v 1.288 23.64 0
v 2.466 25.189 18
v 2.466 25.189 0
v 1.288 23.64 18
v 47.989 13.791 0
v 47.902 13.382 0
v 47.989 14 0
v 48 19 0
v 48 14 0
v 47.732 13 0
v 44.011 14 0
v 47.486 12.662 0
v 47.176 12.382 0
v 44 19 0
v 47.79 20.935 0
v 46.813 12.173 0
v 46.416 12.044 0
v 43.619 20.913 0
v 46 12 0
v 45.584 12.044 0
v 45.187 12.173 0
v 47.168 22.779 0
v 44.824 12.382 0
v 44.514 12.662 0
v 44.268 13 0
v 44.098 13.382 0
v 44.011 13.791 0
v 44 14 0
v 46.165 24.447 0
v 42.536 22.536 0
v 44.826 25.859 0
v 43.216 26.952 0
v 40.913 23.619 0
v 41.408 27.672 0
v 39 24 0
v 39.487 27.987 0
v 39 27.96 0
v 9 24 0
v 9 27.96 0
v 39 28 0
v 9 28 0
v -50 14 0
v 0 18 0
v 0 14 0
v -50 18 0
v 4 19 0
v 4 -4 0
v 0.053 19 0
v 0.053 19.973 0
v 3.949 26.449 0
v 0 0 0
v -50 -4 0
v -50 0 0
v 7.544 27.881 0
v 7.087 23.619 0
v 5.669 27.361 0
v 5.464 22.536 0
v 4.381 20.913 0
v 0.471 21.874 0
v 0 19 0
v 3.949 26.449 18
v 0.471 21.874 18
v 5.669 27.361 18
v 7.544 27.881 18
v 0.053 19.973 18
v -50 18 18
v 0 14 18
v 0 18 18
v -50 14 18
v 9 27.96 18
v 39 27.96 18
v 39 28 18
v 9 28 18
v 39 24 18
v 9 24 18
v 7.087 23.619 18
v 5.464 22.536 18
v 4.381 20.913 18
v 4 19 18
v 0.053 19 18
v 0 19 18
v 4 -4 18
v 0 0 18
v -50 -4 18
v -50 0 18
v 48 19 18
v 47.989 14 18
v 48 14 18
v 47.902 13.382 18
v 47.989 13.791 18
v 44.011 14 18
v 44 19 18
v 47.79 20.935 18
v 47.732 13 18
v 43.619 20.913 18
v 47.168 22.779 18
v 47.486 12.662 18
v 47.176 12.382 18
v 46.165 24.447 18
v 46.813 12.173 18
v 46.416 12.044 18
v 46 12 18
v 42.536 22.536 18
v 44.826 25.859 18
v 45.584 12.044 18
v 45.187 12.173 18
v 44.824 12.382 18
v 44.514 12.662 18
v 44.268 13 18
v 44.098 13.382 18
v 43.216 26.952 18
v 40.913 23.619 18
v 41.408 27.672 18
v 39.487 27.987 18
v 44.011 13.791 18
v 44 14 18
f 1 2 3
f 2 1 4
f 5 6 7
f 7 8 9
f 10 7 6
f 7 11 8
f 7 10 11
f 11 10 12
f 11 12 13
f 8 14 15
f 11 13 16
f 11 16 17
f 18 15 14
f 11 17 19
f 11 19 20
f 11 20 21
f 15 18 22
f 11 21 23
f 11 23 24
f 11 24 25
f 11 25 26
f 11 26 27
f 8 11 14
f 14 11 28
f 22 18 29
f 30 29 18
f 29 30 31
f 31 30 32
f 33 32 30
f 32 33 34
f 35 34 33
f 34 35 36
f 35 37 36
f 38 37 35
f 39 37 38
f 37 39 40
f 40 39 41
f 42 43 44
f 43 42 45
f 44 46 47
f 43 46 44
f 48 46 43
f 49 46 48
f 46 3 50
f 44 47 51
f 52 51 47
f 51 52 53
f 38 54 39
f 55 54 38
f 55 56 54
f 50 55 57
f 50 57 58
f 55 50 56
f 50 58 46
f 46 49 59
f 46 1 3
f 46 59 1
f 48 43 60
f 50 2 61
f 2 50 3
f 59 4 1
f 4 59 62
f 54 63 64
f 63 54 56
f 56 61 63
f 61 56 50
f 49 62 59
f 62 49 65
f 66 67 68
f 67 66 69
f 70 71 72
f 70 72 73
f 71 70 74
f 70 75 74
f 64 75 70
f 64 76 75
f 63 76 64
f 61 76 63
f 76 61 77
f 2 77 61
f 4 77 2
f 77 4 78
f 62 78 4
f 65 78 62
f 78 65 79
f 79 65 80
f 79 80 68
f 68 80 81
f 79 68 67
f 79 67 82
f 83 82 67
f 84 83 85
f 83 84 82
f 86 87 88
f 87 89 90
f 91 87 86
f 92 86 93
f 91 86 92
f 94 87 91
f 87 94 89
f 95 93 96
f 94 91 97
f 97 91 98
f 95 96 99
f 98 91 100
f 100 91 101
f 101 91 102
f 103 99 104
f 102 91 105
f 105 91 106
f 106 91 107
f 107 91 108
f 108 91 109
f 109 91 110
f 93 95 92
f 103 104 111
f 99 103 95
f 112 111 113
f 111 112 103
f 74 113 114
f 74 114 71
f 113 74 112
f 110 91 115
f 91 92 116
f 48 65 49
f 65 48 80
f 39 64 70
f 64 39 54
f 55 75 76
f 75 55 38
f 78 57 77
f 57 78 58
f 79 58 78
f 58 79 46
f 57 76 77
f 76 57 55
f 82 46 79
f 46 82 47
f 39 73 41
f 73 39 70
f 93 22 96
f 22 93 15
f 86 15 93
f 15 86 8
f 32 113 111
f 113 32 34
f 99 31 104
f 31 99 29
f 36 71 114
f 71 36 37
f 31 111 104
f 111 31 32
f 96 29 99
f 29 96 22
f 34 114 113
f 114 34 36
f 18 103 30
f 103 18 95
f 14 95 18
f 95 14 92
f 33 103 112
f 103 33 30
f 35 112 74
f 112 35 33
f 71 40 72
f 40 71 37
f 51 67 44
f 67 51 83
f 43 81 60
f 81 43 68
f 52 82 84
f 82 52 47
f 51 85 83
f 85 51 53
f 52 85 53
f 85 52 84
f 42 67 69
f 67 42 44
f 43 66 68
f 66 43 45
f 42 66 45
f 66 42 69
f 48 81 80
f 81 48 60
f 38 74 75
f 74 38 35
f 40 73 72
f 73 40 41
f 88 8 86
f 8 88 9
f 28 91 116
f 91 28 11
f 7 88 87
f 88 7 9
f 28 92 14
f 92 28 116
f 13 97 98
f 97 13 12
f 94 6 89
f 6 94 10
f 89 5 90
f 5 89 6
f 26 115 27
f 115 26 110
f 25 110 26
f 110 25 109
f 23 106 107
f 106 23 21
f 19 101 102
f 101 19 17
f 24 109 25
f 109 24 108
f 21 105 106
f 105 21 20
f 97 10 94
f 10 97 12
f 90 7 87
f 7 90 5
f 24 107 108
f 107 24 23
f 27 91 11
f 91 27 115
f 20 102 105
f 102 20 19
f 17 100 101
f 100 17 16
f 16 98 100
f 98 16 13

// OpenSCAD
// the thickness of the lines as as seen from above (don't recommend much more than 6 or the geometry gets messy)
thickness = 4;

// how high it will protrude from the build plate
width = 18;

// the length of the part that goes onto the shelf
length = 50;

// the shelf thickness
shelf = 18;

// how far it goes down below the bottom of the shelf (should be at least equal to thickness
hang = 5;

// diameter of hook bends
gap = 10;

// vertical part above the hook to prevent slipping off
tip = 5;

// width of the trough of the hook (wide U - positive number vs. semi-circle, 0)
trough = 30;

module hook() {
  union() {
    // the part above the shelf
    translate([-length, 0, 0])
    cube([length, width, thickness]);

	 // the part below the shelf
    translate([-length, 0, -shelf])
	 cube([length, width, thickness]);

    // the part that goes down to the hook
    translate([0, 0, -shelf-hang+thickness])
    cube([thickness, width, hang+shelf]);

    // the first round part of the hook
    difference() {
      // a big cylinder
      translate([thickness+gap/2, 0, -shelf-hang+thickness])
      rotate([270, 0, 0])
      cylinder(h=width, d=gap+2*thickness);

      // minus a smaller cylinder
      translate([gap/2+thickness, -.1, -shelf-hang+thickness])
      rotate([270, 0, 0])
      cylinder(h=width+.2, d=gap);

      // minus a cube to turn it into a semicircle
      translate([thickness, -.1, -shelf-hang+thickness])
      cube([gap+(2*thickness)+.1, width+.2, gap+2*thickness]);

		// minus another cube to turn it into a quarter circle
		translate([gap/2+thickness, -0.1, -shelf-hang-gap/2-thickness])
		cube([gap+2*thickness, width+thickness, gap+2*thickness]);
    }



    // the second round part of the hook
    
    difference() {
      // a big cylinder
      translate([trough+thickness+gap/2, 0, -shelf-hang+thickness])
      rotate([270, 0, 0])
      cylinder(h=width, d=gap+2*thickness);

      // minus a smaller cylinder
      translate([gap/2+thickness+trough, -.1, -shelf-hang+thickness])
      rotate([270, 0, 0])
      cylinder(h=width+.2, d=gap);

      // minus a cube to turn it into a semicircle
      translate([trough, -.1, -shelf-hang+thickness])
      cube([gap+(2*thickness), width+.2, gap+(2*thickness)]);

		// minus another cube to turn it into a quarter circle
		translate([trough-gap/2+thickness, -0.1, -shelf-hang-gap+thickness])
		cube([gap, width+.2, gap+2*thickness]);
    }

	 // add a bar between the two curves
	 translate([gap/2+thickness,0,-shelf-hang-gap/2])
	 cube([trough,width,thickness]);

    // add a vertical tip above the hook
    translate([thickness+gap+trough, 0, -shelf-hang+thickness])
    cube([thickness, width, tip]);

    // add a rounded tip to the hook
    translate([thickness*1.5+gap+trough, width, -shelf-hang+tip+thickness])
	 rotate([90,90,0])
    cylinder(h=width, r=thickness/2, $fs=.1);
  }
}

// comment out the rotate below before making changes to above, 
// for sanity sake
rotate([90, 0, 0])
hook();
